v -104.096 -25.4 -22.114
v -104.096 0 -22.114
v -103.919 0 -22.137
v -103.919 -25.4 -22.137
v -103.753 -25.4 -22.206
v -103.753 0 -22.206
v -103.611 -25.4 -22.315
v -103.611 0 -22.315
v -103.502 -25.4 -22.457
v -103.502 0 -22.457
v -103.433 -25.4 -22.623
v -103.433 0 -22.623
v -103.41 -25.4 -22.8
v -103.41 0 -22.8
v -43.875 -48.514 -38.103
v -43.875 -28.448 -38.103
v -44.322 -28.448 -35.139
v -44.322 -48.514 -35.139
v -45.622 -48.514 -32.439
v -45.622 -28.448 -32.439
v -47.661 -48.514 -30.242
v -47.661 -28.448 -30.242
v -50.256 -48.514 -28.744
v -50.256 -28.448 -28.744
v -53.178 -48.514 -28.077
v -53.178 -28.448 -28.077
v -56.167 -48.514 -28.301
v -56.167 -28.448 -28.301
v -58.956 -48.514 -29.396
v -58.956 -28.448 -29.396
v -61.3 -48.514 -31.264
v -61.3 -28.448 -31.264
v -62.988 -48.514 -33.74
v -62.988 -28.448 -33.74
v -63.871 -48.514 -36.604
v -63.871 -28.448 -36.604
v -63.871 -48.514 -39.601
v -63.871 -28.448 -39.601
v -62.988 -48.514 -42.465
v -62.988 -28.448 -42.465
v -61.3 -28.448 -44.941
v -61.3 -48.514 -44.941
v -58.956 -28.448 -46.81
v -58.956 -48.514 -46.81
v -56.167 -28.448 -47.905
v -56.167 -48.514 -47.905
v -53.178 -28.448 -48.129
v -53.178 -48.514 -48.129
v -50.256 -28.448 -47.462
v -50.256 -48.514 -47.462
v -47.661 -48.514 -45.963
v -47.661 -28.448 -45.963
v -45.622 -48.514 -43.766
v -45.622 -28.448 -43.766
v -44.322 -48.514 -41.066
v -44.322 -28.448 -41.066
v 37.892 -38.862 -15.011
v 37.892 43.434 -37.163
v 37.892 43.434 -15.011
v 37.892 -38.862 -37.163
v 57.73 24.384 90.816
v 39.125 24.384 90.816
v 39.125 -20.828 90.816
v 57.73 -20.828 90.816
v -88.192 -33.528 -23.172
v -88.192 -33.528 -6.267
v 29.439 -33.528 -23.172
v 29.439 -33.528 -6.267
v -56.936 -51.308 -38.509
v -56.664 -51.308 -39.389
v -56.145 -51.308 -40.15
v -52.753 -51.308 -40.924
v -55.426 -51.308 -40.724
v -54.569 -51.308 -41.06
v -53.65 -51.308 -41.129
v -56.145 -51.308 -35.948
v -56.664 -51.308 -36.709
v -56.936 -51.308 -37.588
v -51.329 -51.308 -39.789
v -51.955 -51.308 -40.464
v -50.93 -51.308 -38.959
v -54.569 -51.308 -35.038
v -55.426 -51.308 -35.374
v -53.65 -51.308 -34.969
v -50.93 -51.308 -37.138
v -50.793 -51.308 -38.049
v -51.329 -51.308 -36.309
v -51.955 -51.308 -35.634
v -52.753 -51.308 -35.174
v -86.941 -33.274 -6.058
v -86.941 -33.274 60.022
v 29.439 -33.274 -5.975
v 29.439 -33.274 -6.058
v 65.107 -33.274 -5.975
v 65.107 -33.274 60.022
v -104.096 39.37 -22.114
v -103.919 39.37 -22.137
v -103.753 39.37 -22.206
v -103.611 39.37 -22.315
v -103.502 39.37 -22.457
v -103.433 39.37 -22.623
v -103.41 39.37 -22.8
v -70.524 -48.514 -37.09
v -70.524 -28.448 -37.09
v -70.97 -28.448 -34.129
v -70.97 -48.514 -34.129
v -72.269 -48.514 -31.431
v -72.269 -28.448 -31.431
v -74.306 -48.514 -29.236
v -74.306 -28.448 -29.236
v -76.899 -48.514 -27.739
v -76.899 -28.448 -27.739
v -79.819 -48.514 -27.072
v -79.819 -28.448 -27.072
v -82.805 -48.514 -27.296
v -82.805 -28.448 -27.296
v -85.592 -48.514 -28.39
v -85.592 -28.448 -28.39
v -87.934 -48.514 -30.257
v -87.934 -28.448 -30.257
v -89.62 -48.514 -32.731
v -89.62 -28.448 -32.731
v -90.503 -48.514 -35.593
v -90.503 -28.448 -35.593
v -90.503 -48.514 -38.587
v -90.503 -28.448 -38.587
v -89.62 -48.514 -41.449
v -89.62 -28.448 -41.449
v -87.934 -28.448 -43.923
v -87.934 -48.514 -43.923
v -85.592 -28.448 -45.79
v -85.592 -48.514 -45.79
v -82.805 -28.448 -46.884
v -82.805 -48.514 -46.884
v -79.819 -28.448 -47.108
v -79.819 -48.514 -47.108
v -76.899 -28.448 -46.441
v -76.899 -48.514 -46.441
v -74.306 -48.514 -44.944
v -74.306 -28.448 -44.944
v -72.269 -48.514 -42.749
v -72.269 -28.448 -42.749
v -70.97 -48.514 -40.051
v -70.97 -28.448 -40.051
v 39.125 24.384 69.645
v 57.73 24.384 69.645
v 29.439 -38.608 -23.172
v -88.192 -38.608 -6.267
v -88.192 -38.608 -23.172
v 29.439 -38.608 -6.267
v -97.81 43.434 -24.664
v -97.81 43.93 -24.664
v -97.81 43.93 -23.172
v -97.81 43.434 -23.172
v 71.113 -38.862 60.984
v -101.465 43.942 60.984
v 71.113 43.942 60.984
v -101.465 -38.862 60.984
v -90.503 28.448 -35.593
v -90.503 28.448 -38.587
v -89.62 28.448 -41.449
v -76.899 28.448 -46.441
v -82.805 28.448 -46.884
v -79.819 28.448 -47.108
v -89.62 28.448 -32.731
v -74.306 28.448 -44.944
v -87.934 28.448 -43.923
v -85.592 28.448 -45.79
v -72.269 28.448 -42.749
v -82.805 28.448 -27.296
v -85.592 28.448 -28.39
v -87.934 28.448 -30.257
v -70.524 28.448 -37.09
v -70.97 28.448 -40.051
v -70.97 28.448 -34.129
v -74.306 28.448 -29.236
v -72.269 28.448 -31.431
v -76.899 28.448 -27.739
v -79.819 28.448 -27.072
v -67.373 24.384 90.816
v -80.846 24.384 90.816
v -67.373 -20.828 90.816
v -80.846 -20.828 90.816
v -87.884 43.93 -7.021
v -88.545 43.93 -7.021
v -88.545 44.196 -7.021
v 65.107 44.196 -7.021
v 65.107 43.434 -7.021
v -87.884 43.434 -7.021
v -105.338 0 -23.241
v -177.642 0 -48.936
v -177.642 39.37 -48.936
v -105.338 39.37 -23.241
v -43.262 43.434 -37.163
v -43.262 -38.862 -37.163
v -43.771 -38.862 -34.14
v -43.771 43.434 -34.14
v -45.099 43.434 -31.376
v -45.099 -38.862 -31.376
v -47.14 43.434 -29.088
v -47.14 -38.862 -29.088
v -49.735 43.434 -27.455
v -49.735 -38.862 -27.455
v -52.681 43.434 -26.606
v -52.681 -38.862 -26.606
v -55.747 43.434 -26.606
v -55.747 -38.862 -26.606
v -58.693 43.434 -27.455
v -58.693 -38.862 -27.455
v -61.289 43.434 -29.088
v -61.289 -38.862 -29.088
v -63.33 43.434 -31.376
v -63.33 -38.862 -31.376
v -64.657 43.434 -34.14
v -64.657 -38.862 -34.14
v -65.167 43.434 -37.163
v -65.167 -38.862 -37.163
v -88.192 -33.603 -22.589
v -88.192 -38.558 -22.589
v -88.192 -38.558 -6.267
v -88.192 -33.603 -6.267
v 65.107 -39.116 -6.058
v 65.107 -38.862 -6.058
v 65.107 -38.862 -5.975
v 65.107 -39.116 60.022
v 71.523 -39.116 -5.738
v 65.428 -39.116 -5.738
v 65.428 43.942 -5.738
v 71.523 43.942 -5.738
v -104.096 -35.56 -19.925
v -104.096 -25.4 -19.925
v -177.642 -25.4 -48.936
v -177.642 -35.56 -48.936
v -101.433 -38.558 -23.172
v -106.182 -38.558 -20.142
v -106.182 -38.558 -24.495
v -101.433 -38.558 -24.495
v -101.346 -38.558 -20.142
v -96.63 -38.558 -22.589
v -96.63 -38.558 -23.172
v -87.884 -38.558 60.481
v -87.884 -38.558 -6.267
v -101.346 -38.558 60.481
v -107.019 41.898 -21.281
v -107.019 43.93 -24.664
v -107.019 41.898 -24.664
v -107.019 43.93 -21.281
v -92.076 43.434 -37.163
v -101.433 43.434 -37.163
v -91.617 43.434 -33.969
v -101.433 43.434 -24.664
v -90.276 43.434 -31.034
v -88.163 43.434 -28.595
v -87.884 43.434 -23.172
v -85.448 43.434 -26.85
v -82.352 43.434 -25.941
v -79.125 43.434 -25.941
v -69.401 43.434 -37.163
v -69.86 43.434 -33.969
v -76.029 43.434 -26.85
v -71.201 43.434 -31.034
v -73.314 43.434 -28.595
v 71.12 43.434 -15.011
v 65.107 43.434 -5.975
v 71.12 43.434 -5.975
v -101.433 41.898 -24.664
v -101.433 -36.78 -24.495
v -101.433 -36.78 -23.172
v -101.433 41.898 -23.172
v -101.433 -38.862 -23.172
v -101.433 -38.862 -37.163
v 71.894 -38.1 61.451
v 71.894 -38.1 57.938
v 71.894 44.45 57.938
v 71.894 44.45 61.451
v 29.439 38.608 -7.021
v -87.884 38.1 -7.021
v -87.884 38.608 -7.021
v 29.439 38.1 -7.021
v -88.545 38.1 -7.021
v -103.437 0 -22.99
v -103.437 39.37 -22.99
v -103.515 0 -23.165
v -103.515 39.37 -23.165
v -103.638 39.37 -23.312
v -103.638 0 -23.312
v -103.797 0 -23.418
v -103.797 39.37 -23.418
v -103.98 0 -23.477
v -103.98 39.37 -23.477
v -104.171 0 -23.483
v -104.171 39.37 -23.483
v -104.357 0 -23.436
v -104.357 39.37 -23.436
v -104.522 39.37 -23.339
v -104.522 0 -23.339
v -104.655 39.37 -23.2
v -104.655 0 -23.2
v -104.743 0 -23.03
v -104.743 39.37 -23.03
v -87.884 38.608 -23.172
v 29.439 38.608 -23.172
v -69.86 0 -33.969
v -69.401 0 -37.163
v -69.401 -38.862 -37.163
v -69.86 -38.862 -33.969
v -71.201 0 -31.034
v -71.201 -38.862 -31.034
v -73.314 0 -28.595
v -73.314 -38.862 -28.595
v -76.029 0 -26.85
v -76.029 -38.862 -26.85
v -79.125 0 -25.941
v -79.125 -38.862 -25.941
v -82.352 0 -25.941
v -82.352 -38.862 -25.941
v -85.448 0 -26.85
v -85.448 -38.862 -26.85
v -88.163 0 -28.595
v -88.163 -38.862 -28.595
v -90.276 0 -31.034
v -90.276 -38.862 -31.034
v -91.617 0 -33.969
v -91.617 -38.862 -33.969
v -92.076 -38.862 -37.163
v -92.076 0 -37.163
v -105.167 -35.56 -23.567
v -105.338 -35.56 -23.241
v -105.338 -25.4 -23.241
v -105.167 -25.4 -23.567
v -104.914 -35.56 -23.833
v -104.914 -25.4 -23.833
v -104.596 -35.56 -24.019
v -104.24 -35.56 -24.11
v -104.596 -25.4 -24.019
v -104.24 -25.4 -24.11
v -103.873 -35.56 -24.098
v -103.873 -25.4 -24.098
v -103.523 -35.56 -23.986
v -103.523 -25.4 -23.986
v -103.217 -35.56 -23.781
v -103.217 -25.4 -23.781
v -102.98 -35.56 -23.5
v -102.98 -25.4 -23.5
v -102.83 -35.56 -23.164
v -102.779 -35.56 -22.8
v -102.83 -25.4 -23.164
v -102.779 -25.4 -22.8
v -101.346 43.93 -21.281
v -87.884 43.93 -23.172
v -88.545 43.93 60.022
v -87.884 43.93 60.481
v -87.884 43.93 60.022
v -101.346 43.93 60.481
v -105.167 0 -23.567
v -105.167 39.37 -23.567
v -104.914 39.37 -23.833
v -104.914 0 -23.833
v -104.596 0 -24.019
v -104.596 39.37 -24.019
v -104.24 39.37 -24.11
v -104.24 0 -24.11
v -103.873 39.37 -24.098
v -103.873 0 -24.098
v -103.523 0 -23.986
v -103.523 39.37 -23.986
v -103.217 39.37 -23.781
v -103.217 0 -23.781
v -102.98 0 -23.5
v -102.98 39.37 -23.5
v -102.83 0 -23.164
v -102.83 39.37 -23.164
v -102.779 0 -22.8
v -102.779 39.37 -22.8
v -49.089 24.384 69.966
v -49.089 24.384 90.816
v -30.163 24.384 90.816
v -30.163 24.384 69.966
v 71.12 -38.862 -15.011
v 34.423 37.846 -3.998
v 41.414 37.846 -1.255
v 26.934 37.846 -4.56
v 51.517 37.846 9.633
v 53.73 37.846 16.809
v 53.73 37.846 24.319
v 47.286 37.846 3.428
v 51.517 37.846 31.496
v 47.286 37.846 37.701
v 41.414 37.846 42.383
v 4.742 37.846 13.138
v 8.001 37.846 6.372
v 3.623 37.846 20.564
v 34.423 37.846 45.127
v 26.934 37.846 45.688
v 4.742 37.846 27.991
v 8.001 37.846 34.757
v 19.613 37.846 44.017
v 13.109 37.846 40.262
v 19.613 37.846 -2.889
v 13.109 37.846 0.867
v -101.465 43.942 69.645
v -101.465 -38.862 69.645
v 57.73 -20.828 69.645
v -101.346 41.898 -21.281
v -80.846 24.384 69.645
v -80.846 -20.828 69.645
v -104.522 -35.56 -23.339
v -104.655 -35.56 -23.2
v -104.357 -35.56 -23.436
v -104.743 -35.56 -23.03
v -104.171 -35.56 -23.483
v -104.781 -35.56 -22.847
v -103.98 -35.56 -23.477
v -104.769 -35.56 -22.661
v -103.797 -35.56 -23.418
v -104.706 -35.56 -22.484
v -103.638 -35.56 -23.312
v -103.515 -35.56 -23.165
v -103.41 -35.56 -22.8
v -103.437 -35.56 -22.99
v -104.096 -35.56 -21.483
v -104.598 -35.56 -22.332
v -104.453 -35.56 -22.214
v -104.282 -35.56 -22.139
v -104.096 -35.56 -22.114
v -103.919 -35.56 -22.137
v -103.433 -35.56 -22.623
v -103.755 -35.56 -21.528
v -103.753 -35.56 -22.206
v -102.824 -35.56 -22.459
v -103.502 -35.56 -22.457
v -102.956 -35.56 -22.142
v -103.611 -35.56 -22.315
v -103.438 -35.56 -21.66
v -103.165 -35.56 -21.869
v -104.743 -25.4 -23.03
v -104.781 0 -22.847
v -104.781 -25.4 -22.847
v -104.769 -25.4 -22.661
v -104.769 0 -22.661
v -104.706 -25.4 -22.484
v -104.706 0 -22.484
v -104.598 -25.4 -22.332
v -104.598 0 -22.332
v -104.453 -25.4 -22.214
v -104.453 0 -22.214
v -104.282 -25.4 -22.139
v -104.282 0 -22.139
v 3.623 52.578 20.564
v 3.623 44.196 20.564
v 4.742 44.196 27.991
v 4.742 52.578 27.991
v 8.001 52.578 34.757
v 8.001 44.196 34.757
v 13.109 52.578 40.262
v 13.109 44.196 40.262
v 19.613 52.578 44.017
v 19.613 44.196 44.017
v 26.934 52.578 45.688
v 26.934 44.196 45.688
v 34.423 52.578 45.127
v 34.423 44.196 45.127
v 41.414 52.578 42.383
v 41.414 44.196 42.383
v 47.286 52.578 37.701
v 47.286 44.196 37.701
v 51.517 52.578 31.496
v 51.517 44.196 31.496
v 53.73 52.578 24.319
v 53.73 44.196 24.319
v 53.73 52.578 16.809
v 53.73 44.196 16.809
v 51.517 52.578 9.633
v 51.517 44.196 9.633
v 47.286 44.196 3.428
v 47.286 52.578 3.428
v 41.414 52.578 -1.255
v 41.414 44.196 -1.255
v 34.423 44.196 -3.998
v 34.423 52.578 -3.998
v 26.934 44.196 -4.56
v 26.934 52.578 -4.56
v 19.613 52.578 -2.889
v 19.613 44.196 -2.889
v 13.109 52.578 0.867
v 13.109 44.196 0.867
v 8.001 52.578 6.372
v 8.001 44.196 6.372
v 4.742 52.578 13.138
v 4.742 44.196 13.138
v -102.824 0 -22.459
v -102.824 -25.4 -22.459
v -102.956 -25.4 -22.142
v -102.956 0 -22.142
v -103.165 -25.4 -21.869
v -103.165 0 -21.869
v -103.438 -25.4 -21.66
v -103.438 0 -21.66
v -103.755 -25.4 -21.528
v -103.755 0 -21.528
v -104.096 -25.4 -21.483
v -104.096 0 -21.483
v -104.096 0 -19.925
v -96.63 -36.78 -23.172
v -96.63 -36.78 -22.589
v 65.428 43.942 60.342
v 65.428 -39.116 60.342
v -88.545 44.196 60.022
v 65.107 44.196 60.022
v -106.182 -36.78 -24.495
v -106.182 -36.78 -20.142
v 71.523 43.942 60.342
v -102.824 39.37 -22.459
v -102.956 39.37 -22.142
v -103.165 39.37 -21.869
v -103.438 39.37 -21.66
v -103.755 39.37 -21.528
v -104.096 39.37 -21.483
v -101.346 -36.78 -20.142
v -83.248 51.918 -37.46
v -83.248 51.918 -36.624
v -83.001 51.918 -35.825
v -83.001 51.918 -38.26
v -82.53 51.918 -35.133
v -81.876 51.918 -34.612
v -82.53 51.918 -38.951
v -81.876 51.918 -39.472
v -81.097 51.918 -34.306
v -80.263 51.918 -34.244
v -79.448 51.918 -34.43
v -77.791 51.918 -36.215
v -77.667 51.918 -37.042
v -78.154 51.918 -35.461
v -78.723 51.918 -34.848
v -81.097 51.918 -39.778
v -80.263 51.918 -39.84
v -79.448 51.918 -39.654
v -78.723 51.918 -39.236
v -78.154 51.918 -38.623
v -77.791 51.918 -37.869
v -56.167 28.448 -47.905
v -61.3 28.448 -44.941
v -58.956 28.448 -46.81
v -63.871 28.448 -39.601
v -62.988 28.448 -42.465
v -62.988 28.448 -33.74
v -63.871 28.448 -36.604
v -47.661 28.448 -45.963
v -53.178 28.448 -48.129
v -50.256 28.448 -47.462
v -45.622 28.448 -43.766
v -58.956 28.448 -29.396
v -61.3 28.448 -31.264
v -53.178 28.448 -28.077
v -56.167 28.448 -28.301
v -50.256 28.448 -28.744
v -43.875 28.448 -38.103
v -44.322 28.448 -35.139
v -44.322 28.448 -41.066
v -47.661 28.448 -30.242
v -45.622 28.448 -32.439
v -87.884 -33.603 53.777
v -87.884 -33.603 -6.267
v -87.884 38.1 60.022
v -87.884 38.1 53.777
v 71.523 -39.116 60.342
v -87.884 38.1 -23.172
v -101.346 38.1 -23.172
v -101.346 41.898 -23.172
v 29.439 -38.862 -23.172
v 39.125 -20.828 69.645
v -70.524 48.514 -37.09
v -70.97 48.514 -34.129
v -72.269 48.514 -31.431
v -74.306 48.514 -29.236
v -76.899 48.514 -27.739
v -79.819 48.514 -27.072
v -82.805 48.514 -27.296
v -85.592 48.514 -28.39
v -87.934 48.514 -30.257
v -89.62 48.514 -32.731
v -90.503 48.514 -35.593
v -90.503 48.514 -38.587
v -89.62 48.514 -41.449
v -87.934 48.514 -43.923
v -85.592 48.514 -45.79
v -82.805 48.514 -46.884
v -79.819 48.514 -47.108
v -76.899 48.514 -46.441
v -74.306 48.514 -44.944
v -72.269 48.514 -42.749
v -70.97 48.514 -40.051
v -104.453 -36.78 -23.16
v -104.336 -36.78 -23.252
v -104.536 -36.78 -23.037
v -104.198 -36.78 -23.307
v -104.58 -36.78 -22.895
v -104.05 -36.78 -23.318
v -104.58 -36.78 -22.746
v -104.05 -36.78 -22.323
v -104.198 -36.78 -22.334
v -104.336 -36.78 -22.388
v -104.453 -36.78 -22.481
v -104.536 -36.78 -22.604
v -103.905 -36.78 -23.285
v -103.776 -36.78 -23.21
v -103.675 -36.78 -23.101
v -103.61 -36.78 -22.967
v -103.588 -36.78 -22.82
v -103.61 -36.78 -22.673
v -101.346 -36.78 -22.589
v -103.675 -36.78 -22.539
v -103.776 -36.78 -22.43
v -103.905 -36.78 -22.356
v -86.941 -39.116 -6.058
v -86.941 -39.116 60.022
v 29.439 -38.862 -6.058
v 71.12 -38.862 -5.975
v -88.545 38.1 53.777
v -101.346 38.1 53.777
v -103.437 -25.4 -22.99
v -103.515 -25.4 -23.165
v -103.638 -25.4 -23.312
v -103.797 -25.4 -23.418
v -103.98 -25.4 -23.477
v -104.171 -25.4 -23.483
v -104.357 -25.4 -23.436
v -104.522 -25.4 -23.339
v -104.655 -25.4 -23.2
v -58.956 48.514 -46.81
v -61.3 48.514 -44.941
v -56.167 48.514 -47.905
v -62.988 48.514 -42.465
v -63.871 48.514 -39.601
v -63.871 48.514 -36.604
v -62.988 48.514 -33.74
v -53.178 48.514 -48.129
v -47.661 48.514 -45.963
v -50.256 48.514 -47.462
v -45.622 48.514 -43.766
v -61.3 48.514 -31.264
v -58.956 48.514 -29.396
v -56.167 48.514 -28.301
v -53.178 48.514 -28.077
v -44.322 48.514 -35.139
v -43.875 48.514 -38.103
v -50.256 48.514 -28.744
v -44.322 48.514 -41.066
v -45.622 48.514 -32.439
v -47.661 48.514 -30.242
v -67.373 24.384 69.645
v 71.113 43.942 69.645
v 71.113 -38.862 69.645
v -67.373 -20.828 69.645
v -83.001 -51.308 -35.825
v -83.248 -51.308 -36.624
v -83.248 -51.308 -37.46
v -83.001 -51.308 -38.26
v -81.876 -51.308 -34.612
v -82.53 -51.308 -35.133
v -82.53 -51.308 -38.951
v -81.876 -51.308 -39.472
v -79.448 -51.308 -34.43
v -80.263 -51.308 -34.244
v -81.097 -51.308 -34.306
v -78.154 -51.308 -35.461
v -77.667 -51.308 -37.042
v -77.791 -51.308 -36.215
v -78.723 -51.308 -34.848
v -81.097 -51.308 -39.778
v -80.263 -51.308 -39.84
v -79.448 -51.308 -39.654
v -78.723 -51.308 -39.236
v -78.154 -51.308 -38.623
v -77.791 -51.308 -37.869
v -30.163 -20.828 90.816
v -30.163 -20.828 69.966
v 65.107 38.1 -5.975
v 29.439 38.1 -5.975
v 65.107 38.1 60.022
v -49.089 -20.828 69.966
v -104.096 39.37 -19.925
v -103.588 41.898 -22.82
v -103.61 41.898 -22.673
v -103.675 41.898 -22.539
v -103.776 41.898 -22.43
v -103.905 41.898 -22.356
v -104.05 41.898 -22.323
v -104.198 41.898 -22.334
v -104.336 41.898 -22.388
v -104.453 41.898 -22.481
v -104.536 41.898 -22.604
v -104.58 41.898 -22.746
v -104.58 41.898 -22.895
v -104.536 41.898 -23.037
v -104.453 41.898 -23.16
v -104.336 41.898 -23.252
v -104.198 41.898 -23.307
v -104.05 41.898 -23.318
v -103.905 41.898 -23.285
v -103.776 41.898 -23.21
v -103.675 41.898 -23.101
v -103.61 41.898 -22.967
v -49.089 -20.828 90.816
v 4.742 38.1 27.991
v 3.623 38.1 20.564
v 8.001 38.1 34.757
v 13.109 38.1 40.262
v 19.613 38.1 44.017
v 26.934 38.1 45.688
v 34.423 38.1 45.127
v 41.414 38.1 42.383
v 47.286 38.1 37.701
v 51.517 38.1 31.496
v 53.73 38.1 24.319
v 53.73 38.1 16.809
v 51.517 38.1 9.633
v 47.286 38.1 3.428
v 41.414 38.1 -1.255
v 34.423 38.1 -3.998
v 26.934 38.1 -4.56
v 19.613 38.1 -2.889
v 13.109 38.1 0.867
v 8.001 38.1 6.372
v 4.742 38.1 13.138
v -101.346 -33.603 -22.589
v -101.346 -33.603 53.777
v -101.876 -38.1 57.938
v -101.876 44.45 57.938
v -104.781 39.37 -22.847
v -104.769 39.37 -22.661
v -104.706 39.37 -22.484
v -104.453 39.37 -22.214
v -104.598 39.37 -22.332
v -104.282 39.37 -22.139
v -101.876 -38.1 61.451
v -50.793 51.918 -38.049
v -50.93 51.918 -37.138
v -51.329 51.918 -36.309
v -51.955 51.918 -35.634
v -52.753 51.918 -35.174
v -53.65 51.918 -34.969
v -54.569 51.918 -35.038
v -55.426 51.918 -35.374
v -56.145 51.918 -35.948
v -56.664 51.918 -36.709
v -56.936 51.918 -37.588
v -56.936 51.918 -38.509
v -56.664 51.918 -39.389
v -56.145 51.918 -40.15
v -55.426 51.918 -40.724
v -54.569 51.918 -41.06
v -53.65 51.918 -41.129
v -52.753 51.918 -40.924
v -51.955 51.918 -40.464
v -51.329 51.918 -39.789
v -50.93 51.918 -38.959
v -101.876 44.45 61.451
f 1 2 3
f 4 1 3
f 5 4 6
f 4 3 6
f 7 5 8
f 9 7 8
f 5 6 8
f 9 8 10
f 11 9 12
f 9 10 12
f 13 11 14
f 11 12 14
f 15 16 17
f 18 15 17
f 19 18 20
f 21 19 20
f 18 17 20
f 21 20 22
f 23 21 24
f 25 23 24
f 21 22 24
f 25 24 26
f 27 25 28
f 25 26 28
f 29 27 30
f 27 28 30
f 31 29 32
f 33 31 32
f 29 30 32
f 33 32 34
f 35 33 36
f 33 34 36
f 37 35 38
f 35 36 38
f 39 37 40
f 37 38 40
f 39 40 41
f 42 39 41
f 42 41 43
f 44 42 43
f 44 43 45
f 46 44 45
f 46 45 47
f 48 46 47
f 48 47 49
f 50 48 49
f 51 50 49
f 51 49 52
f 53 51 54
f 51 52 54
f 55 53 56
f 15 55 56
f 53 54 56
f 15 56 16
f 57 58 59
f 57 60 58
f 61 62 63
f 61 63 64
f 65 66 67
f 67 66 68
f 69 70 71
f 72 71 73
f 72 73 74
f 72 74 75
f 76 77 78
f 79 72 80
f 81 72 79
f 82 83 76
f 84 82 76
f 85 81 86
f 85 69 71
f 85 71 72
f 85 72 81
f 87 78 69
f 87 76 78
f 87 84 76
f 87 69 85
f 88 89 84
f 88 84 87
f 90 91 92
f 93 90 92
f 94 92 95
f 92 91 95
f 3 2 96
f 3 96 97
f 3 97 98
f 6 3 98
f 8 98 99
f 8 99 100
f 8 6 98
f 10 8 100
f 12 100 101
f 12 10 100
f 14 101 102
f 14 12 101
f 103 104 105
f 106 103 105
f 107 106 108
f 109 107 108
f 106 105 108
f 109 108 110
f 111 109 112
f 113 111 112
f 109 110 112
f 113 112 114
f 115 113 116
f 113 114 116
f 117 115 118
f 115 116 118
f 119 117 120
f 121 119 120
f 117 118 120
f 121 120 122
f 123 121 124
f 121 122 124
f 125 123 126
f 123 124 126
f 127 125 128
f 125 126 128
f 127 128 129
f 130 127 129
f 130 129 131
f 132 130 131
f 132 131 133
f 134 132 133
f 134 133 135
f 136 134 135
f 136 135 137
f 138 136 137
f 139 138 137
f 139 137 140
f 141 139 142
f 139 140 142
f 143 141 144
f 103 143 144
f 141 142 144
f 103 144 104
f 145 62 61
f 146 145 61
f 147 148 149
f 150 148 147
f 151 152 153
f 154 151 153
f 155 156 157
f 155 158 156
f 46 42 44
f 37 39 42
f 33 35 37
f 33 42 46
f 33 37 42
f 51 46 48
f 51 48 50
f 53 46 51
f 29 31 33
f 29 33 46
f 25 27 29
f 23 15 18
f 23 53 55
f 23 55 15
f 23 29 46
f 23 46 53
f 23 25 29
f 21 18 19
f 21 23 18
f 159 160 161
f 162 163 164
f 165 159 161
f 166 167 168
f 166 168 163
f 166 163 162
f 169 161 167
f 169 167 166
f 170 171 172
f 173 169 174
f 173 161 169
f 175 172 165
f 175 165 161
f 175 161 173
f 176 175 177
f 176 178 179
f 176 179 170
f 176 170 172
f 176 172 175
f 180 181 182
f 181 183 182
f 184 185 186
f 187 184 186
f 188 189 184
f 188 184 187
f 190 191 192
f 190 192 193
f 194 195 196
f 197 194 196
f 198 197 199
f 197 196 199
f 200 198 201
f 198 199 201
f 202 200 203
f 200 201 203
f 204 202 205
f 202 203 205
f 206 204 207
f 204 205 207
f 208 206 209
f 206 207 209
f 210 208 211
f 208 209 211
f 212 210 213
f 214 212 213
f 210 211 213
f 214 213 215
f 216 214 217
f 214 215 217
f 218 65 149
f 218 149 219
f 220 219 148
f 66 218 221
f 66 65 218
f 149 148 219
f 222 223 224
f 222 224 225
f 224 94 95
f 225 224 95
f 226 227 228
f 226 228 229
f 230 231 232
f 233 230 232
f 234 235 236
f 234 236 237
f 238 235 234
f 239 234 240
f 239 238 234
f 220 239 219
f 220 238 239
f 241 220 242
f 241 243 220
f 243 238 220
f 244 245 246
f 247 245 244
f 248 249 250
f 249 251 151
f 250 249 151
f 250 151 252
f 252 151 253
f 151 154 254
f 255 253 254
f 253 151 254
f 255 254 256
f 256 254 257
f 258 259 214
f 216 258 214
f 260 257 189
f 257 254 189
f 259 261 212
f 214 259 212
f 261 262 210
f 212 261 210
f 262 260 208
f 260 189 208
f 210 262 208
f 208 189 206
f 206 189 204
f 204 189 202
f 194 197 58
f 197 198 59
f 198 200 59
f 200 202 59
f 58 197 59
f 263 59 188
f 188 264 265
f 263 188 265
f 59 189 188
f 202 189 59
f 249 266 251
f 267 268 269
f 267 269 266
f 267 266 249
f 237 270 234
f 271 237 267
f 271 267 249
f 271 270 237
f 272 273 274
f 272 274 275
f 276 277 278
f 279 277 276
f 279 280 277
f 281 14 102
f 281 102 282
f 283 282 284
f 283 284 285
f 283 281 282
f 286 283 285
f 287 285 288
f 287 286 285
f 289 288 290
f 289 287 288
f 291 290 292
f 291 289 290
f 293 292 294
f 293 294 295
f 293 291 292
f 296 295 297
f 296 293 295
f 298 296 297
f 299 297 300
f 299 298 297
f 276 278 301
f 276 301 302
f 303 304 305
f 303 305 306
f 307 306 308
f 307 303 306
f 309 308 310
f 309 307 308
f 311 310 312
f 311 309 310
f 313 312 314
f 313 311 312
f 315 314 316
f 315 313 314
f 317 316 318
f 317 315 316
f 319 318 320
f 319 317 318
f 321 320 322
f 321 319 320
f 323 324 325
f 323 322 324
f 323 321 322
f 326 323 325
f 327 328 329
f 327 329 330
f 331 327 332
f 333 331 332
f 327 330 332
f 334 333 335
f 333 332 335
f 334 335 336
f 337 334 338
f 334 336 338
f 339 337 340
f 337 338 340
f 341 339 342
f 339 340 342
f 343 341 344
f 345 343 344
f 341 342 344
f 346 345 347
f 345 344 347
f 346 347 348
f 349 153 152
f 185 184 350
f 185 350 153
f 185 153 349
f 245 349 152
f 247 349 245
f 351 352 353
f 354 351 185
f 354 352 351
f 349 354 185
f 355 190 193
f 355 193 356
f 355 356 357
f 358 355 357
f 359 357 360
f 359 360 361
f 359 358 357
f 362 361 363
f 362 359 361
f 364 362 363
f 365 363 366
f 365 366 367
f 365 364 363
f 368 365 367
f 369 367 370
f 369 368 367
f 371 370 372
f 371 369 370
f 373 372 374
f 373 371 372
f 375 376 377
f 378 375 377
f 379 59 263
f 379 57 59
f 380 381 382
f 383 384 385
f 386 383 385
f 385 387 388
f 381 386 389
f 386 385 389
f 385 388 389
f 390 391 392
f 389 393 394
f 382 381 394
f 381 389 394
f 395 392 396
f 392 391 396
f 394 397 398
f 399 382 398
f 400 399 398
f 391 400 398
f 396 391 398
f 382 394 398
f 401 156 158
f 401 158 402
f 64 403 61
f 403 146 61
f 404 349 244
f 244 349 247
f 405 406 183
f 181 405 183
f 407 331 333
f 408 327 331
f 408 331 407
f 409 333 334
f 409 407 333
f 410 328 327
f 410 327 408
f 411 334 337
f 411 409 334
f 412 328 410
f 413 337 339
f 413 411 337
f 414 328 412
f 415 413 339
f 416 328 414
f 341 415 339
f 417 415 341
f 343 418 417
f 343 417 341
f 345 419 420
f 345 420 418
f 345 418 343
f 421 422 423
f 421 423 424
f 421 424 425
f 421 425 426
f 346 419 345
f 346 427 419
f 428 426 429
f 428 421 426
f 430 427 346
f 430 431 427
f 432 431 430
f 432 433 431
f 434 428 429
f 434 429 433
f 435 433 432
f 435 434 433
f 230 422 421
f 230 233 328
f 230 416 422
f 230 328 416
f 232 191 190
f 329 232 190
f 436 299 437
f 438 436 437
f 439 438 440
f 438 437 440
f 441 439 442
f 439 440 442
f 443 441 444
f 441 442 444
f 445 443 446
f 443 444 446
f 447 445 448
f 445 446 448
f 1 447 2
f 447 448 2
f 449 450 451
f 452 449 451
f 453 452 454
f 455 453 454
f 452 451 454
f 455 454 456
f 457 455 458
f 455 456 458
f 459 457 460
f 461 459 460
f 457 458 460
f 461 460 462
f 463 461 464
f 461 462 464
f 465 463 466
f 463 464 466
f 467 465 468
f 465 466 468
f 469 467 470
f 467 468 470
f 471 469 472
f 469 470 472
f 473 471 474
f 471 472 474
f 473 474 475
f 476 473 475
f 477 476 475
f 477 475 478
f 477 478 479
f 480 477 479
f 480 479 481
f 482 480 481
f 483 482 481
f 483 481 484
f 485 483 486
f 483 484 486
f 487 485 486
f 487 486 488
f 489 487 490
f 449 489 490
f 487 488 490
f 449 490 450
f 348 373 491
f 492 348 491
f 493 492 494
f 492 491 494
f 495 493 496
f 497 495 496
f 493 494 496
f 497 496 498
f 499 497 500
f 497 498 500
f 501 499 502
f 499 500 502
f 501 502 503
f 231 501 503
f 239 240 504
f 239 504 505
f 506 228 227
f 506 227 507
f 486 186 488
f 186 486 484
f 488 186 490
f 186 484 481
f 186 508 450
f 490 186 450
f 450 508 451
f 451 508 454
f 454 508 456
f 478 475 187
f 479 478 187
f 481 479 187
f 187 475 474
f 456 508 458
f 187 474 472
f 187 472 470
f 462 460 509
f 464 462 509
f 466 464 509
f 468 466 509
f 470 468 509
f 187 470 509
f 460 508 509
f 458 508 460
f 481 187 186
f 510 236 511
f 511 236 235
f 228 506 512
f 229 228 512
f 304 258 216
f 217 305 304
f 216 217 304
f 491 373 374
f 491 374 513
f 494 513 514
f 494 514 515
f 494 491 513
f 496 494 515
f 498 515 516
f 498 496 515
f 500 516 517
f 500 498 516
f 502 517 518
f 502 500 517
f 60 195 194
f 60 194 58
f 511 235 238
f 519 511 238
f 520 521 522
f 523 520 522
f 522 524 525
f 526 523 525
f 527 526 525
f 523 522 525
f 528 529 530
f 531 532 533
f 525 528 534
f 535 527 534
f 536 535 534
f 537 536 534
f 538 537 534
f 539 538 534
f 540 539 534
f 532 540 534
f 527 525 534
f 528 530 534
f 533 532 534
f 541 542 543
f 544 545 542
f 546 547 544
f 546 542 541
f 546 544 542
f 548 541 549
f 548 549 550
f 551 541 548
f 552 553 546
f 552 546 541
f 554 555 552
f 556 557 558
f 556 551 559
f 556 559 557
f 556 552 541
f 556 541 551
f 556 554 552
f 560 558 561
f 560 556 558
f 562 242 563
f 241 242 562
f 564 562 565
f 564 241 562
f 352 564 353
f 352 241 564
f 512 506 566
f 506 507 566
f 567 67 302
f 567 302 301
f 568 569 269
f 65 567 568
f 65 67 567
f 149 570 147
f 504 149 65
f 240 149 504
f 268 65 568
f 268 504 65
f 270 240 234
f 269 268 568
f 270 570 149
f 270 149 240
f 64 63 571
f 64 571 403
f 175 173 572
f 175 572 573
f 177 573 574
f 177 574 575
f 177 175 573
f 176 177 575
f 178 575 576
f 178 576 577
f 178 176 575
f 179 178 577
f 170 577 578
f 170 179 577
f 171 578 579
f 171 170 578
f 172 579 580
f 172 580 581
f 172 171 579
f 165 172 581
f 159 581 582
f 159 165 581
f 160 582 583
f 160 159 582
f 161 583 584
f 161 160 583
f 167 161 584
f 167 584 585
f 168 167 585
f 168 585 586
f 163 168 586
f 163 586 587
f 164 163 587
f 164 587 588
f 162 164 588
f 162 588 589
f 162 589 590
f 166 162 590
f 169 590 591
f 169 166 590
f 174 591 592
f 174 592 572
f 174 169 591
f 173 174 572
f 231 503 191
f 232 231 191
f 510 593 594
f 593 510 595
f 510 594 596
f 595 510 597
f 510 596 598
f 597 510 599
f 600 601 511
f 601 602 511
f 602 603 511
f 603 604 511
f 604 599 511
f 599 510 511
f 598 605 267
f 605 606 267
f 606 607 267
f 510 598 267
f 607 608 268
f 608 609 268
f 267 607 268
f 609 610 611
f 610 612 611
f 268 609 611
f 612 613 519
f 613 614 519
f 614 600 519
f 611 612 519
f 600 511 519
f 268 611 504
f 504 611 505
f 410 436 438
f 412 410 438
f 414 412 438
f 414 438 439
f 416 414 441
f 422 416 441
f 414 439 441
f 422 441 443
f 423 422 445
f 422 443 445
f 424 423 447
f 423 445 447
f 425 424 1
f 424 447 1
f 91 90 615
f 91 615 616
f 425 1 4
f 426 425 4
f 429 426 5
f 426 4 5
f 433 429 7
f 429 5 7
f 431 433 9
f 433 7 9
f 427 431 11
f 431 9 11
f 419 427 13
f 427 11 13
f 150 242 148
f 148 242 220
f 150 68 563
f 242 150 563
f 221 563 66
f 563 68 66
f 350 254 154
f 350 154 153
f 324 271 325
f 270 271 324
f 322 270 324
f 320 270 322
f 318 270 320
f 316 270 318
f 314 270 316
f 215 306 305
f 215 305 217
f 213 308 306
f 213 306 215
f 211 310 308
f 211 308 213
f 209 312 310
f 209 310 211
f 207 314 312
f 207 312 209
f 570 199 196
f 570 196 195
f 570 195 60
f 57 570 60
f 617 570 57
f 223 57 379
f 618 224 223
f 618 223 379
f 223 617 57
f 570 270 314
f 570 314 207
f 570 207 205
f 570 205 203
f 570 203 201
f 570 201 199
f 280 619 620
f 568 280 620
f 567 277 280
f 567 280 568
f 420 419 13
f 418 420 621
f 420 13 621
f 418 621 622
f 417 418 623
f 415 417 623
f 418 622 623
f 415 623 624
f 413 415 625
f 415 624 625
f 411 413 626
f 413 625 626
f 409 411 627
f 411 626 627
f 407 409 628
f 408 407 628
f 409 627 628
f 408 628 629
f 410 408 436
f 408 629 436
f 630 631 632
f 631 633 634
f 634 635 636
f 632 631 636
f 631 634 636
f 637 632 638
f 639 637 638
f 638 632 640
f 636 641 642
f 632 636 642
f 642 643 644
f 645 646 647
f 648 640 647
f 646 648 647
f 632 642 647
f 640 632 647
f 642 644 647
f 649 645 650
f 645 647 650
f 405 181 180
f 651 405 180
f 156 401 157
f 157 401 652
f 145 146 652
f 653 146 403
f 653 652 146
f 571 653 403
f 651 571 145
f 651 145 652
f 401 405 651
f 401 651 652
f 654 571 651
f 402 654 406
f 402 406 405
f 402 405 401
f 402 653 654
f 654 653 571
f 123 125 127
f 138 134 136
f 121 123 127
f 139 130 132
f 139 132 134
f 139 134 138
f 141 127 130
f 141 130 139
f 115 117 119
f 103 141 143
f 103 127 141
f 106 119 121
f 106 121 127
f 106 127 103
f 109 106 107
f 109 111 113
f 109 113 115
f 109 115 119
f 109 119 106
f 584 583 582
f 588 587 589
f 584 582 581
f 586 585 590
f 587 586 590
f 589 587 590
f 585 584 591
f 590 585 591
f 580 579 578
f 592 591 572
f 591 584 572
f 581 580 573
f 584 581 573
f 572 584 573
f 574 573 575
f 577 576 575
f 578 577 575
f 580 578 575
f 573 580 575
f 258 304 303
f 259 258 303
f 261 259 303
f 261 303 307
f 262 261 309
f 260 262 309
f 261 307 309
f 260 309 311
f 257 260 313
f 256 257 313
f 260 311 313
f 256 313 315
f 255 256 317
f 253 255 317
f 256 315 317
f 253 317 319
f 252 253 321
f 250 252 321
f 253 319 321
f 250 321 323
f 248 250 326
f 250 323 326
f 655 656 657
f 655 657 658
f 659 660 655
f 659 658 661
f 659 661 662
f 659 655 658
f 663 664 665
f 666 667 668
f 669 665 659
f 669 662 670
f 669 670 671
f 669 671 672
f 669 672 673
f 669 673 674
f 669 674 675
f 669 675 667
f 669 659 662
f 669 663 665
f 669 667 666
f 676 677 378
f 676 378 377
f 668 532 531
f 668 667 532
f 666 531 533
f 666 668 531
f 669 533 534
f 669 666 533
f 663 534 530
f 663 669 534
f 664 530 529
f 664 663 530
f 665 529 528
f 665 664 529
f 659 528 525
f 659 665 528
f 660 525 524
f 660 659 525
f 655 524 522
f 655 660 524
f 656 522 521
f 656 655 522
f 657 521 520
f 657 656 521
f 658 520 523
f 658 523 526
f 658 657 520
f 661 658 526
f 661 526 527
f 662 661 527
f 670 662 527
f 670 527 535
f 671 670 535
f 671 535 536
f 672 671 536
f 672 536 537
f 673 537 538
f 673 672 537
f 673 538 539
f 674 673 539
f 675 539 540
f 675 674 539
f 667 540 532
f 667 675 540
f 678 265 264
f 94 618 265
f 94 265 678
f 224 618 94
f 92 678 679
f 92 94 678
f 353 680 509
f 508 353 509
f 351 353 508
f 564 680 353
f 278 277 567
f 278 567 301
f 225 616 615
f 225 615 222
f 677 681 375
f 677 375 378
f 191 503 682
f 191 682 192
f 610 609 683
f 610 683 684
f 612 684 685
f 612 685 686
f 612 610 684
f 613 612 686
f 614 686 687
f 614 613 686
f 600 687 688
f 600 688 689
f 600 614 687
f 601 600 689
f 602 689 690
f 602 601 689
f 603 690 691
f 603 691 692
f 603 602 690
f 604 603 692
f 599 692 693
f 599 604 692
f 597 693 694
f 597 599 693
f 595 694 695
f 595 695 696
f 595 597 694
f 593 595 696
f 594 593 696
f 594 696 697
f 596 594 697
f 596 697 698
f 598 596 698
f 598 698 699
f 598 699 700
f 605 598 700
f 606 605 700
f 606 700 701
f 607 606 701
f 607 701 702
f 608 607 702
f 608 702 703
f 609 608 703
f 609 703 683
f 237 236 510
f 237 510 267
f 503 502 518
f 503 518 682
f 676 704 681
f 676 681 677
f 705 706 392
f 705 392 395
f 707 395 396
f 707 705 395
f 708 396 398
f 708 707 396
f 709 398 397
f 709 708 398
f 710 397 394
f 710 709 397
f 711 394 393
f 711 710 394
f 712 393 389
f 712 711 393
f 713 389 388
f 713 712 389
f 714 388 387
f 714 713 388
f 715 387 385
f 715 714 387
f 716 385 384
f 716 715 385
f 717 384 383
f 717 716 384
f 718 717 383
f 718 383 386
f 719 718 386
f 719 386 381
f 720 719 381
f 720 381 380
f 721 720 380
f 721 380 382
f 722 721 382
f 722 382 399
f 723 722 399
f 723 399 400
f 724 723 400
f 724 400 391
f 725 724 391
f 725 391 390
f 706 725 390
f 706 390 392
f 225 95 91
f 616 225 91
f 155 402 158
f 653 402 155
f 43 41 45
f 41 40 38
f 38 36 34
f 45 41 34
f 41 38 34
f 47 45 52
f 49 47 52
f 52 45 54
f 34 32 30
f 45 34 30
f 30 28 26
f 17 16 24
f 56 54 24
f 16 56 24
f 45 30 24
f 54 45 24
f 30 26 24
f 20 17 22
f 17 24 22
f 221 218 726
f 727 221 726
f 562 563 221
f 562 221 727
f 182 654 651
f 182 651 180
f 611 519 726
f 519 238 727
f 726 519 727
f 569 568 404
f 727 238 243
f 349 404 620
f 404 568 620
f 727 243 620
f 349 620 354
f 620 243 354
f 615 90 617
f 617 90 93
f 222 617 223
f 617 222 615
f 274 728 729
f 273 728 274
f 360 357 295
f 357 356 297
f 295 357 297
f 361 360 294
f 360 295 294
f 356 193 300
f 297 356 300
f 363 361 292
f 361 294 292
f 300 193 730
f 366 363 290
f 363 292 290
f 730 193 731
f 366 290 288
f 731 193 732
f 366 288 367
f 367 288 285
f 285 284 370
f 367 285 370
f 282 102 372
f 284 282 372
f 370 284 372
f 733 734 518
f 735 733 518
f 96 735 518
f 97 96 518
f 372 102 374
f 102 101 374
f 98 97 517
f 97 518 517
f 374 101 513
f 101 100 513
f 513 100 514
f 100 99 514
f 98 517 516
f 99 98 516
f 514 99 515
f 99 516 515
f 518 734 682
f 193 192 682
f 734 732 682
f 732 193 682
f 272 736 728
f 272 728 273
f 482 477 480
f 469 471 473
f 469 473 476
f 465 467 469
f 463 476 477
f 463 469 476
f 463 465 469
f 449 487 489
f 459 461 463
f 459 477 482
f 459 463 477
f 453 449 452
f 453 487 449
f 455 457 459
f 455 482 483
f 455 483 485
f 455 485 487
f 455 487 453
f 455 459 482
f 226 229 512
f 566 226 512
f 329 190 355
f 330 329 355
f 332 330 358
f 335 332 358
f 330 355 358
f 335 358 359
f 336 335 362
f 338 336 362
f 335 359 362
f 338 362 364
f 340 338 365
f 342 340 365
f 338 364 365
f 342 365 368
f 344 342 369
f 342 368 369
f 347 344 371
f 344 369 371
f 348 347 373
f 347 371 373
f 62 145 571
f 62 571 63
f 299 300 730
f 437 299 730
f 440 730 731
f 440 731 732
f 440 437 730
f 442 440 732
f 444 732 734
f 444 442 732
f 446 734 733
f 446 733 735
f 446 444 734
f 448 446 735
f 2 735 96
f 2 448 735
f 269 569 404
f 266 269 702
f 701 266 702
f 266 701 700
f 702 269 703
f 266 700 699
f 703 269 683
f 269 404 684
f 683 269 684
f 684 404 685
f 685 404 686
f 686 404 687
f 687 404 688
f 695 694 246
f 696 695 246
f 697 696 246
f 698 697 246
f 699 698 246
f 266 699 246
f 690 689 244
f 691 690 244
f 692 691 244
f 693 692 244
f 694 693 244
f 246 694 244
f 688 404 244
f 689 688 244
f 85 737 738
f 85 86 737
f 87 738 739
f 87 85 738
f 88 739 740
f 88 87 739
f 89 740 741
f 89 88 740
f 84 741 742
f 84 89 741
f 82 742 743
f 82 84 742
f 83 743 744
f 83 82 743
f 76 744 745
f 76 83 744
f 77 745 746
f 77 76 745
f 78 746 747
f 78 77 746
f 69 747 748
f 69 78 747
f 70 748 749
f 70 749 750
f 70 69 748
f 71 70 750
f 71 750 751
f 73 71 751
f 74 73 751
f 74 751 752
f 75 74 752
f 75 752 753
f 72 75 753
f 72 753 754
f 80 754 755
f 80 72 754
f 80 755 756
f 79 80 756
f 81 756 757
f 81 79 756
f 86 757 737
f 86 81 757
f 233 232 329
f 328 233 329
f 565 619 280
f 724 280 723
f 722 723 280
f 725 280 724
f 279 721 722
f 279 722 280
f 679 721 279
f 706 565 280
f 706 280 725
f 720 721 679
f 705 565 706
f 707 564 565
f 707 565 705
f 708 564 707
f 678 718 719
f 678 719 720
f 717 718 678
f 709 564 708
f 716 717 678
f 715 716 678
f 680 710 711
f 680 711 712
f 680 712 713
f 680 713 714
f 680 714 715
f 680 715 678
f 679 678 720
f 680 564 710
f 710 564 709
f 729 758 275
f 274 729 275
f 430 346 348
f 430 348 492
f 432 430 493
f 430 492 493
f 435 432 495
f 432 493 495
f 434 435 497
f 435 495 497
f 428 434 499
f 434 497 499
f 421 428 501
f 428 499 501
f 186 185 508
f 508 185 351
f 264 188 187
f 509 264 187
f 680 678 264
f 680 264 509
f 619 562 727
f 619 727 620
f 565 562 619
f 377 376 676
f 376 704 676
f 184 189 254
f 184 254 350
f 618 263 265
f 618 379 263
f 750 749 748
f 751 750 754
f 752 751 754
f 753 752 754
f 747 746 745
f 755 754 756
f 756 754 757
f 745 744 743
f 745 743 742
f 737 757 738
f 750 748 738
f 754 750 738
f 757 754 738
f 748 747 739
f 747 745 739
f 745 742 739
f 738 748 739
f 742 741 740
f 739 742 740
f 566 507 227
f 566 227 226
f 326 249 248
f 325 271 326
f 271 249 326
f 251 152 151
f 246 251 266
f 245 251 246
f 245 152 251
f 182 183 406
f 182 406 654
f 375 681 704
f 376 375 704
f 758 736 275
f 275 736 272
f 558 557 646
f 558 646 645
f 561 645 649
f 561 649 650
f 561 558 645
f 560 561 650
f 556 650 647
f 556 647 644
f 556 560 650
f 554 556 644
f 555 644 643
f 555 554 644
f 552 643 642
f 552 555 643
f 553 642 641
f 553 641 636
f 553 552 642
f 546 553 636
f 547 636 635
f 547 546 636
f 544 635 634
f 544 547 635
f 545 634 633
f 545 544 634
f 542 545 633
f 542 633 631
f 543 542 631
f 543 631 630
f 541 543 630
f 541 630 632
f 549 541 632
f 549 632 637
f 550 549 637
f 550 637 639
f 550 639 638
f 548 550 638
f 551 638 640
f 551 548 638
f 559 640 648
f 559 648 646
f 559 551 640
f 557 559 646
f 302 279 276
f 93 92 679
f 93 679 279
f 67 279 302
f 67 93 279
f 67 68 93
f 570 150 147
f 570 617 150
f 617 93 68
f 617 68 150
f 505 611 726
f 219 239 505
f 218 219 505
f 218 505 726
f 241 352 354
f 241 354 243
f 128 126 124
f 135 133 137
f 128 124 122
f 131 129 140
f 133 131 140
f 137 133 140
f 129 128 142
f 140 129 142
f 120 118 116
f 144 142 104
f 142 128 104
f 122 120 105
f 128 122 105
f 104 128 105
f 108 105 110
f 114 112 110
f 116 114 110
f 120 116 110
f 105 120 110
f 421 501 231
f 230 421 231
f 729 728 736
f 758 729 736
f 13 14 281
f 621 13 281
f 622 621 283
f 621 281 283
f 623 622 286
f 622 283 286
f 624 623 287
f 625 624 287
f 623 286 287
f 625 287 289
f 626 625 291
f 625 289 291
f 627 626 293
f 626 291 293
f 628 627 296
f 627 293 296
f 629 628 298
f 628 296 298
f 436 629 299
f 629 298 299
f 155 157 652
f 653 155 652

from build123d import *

# Parameters (mm, degrees)
F1_DEPTH       = 38.862
F1_DEPTH_BACK  = 43.434
F2_R           = 11.3376030002
F2_R_2         = 10.956529081
F3_DEPTH       = 43.942
F3_DEPTH_BACK  = 49.276
F5_START       = 33.528
F4_W           = 45.4701650888
F4_H           = 16.9055731967
F4_W_2         = 72.5773833692
F5_DEPTH       = 5.08
F7_START       = -38.608
F6_W           = 51.5911467373
F6_H           = 16.6140981019
F6_W_2         = 65.8734384924
F7_DEPTH       = 4.826
F9_START       = -87.884
F8_W           = 71.702953428
F8_H           = 6.7039392889
F9_DEPTH       = 13.462
F11_DEPTH      = 35.56
F11_DEPTH_BACK = 39.37
F12_W          = 6.0947537422
F12_H          = 66.0799681209
F13_DEPTH      = 39.116
F13_DEPTH_BACK = 43.942
F15_START      = 33.274
F14_W          = 65.1074424386
F14_H          = 66.0799662583
F14_W_2        = 86.940638721
F15_DEPTH      = 5.842
F17_START      = -38.1
F16_W          = 65.1074424386
F16_H          = 67.042295821
F16_W_2        = 88.5445252061
F17_DEPTH      = 6.096
F18_W          = 100.7238291204
F18_H          = 8.6609646678
F18_W_2        = 71.8539468944
F19_DEPTH      = 38.862
F19_DEPTH_BACK = 43.942
F20_W          = 18.925813958
F20_H          = 20.8504721522
F21_DEPTH      = 20.828
F21_DEPTH_BACK = 24.384
F20_W_2        = 13.4726166725
F20_H_2        = 22.1335813403
F20_W_3        = 18.6050385237
F20_H_3        = 21.1712494493
F22_W          = 173.7697198987
F22_H          = 3.5137236118
F23_DEPTH      = 38.1
F23_DEPTH_BACK = 44.45
F24_DEPTH      = 25.4
F25_W          = 9.2087239027
F25_H          = 3.3827982843
F26_DEPTH      = 2.032
F27_W          = 9.5522403717
F27_H          = 4.3528731912
F28_DEPTH      = 1.778
F29_R          = 0.498771705
F30_DEPTH      = 81.28
F32_START      = 28.448
F31_R          = 10.0539795899
F32_DEPTH      = 20.066
F31_R_2        = 10.0456530786
F34_R          = 3.0887352078
F35_DEPTH      = 51.308
F35_DEPTH_BACK = 51.9176
F34_R_2        = 2.8061072416
F36_R          = 25.1944748939
F37_DEPTH      = 8.382
F37_DEPTH_BACK = 6.35


with BuildPart() as f1:
    # F0 (on Front) → F1 (new body, two sides)
    with BuildSketch(Plane.XZ) as f1_sk:
        Polygon((71.1200013757, -15.0109836832), (71.1200013757, -5.9752459638), (29.439015314, -5.9752459638), (29.439015314, -23.172294721), (-101.4334410429, -23.172294721), (-101.4334410429, -37.1631160378), (37.891805172, -37.1631160378), (37.891805172, -15.0109836832), align=None)
    extrude(amount=F1_DEPTH)
    extrude(f1_sk.sketch, amount=-F1_DEPTH_BACK)

    # F2 (on Front) → F3 (cut, two sides)
    with BuildSketch(Plane.XZ) as f3_sk:
        with Locations((-80.7386860251, -37.1631160378)):
            Circle(F2_R)
        with Locations((-54.214425385, -37.4545902014)):
            Circle(F2_R_2)
    extrude(amount=F3_DEPTH, mode=Mode.SUBTRACT)
    extrude(f3_sk.sketch, amount=-F3_DEPTH_BACK, mode=Mode.SUBTRACT)

    # F4 (on Front) → F5 (join)
    with BuildSketch(Plane.XZ.offset(F5_START)):
        with Locations((7.120330818, -14.7195081227)):
            Rectangle(F4_W, F4_H)
        with Locations((-51.903443411, -14.7195081227)):
            Rectangle(F4_W_2, F4_H)
    extrude(amount=F5_DEPTH)

    # F6 (on Front) → F7 (join)
    with BuildSketch(Plane.XZ.offset(F7_START)):
        with Locations((3.6434419453, -14.8652456701)):
            Rectangle(F6_W, F6_H)
        with Locations((-55.0888506696, -14.8652456701)):
            Rectangle(F6_W_2, F6_H)
    extrude(amount=-F7_DEPTH)

    # F8 (on Right) → F9 (join)
    with BuildSketch(Plane.YZ.offset(F9_START)):
        Polygon((38.1000041962, -23.172294721), (43.9295098186, -23.172294721), (43.9295098186, 60.4811497033), (38.1000041962, 60.4811497033), (38.1000041962, 53.7772104144), align=None)
        with Locations((2.2485274822, 57.1291800588)):
            Rectangle(F8_W, F8_H)
        Polygon((-33.6029492319, -22.5893463939), (-33.6029492319, 53.7772104144), (-33.6029492319, 60.4811497033), (-38.5580323637, 60.4811497033), (-38.5580323637, -22.5893463939), align=None)
    extrude(amount=-F9_DEPTH)

    # F14 (on Front) → F15 (join)
    with BuildSketch(Plane.XZ.offset(F15_START)):
        with Locations((32.5537212193, 26.9815365318)):
            Rectangle(F14_W, F14_H)
        with Locations((-43.4703193605, 26.9815365318)):
            Rectangle(F14_W_2, F14_H)
    extrude(amount=F15_DEPTH)

    # F16 (on Front) → F17 (join)
    with BuildSketch(Plane.XZ.offset(F17_START)):
        with Locations((32.5537212193, 26.5003717504)):
            Rectangle(F16_W, F16_H)
        with Locations((-44.272262603, 26.5003717504)):
            Rectangle(F16_W_2, F16_H)
    extrude(amount=-F17_DEPTH)

    # F25 (on face) → F26 (join)
    with BuildSketch(Plane(origin=(0, 43.9295098186, 0), x_dir=(-1, 0, 0), z_dir=(0, 1, 0))):
        with Locations((102.4142354727, -22.9727905244)):
            Rectangle(F25_W, F25_H)
    extrude(amount=-F26_DEPTH)

    # F27 (on face) → F28 (join)
    with BuildSketch(Plane.XZ.offset(38.5580323637)):
        with Locations((-101.4059185982, -22.3182095215)):
            Rectangle(F27_W, F27_H)
    extrude(amount=-F28_DEPTH)

    # F29 (on face) → F30 (join)
    with BuildSketch(Plane.XZ.offset(38.5580323637)):
        with Locations((-104.0869578719, -22.8203143924)):
            Circle(F29_R)
    extrude(amount=-F30_DEPTH)

    # F36 (on face) → F37 (join, two sides)
    with BuildSketch(Plane(origin=(0, 44.196, 0), x_dir=(-1, 0, 0), z_dir=(0, 1, 0))) as f37_sk:
        with Locations((-28.8171786815, 20.5643624067)):
            Circle(F36_R)
    extrude(amount=F37_DEPTH)
    extrude(f37_sk.sketch, amount=-F37_DEPTH_BACK)


with BuildPart() as f11:
    # F10 (on Front) → F11 (new body, two sides)
    with BuildSketch(Plane.XZ) as f11_sk:
        with BuildLine():
            ThreePointArc((-103.4097694487, -22.8003077209), (-103.9796929185, -23.476895095), (-104.7432717539, -23.0302066148))
            Line((-104.7432717539, -23.0302066148), (-105.3375046329, -23.2413774079))
            ThreePointArc((-105.3375046329, -23.2413774079), (-103.8725498773, -24.0983660815), (-102.7791302347, -22.8003077209))
            ThreePointArc((-102.7791302347, -22.8003077209), (-103.1649315017, -21.8689010697), (-104.0963381529, -21.4830998027))
            Line((-104.0963381529, -21.4830998027), (-104.0963381529, -22.1137390167))
            ThreePointArc((-104.0963381529, -22.1137390167), (-103.6108607664, -22.3148303344), (-103.4097694487, -22.8003077209))
        make_face()
        with BuildLine():
            Line((-105.3375046329, -23.2413774079), (-104.7432717539, -23.0302066148))
            ThreePointArc((-104.7432717539, -23.0302066148), (-104.6572383094, -22.4043688368), (-104.0963381529, -22.1137390167))
            Line((-104.0963381529, -22.1137390167), (-104.0963381529, -21.4830998027))
            ThreePointArc((-104.0963381529, -21.4830998027), (-105.1724462292, -22.0406840589), (-105.3375046329, -23.2413774079))
        make_face()
        with BuildLine():
            Line((-177.6416003704, -48.9358715713), (-105.3375046329, -23.2413774079))
            ThreePointArc((-105.3375046329, -23.2413774079), (-105.1724462292, -22.0406840589), (-104.0963381529, -21.4830998027))
            Line((-104.0963381529, -21.4830998027), (-104.0963381529, -19.9252068996))
            Line((-104.0963381529, -19.9252068996), (-177.6416003704, -48.9358715713))
        make_face()
    extrude(amount=F11_DEPTH)
    extrude(f11_sk.sketch, amount=-F11_DEPTH_BACK)

    # F10 (on Front) → F24 (join)
    with BuildSketch(Plane.XZ):
        with BuildLine():
            ThreePointArc((-103.4097694487, -22.8003077209), (-103.9796929185, -23.476895095), (-104.7432717539, -23.0302066148))
            Line((-104.7432717539, -23.0302066148), (-105.3375046329, -23.2413774079))
            ThreePointArc((-105.3375046329, -23.2413774079), (-103.8725498773, -24.0983660815), (-102.7791302347, -22.8003077209))
            ThreePointArc((-102.7791302347, -22.8003077209), (-103.1649315017, -21.8689010697), (-104.0963381529, -21.4830998027))
            Line((-104.0963381529, -21.4830998027), (-104.0963381529, -22.1137390167))
            ThreePointArc((-104.0963381529, -22.1137390167), (-103.6108607664, -22.3148303344), (-103.4097694487, -22.8003077209))
        make_face()
        with BuildLine():
            Line((-105.3375046329, -23.2413774079), (-104.7432717539, -23.0302066148))
            ThreePointArc((-104.7432717539, -23.0302066148), (-104.6572383094, -22.4043688368), (-104.0963381529, -22.1137390167))
            Line((-104.0963381529, -22.1137390167), (-104.0963381529, -21.4830998027))
            ThreePointArc((-104.0963381529, -21.4830998027), (-105.1724462292, -22.0406840589), (-105.3375046329, -23.2413774079))
        make_face()
        with BuildLine():
            Line((-177.6416003704, -48.9358715713), (-105.3375046329, -23.2413774079))
            ThreePointArc((-105.3375046329, -23.2413774079), (-105.1724462292, -22.0406840589), (-104.0963381529, -21.4830998027))
            Line((-104.0963381529, -21.4830998027), (-104.0963381529, -19.9252068996))
            Line((-104.0963381529, -19.9252068996), (-177.6416003704, -48.9358715713))
        make_face()
    extrude(amount=F24_DEPTH)


with BuildPart() as f13:
    # F12 (on Front) → F13 (new body, two sides)
    with BuildSketch(Plane.XZ) as f13_sk:
        with Locations((68.4755966067, 27.3023128975)):
            Rectangle(F12_W, F12_H)
    extrude(amount=F13_DEPTH)
    extrude(f13_sk.sketch, amount=-F13_DEPTH_BACK)


with BuildPart() as f19:
    # F18 (on Front) → F19 (new body, two sides)
    with BuildSketch(Plane.XZ) as f19_sk:
        with Locations((20.7512695342, 65.3143338859)):
            Rectangle(F18_W, F18_H)
        with Locations((-65.5376184732, 65.3143338859)):
            Rectangle(F18_W_2, F18_H)
    extrude(amount=F19_DEPTH)
    extrude(f19_sk.sketch, amount=-F19_DEPTH_BACK)

    # F20 (on Front) → F21, piece 2 (join, two sides)
    with BuildSketch(Plane.XZ) as f21_2_sk:
        with Locations((-74.1095766425, 79.7492749989)):
            Rectangle(F20_W_2, F20_H_2)
        with Locations((48.4270602465, 80.2304409444)):
            Rectangle(F20_W_3, F20_H_3)
    extrude(amount=F21_DEPTH)
    extrude(f21_2_sk.sketch, amount=-F21_DEPTH_BACK)


with BuildPart() as f21:
    # F20 (on Front) → F21 (new body, two sides)
    with BuildSketch(Plane.XZ) as f21_sk:
        with Locations((-39.6261001006, 80.3908295929)):
            Rectangle(F20_W, F20_H)
    extrude(amount=F21_DEPTH)
    extrude(f21_sk.sketch, amount=-F21_DEPTH_BACK)


with BuildPart() as f23:
    # F22 (on Front) → F23 (new body, two sides)
    with BuildSketch(Plane.XZ) as f23_sk:
        with Locations((-14.9909071624, 59.6944950521)):
            Rectangle(F22_W, F22_H)
    extrude(amount=F23_DEPTH)
    extrude(f23_sk.sketch, amount=-F23_DEPTH_BACK)


with BuildPart() as f32:
    # F31 (on Front) → F32 (new body)
    with BuildSketch(Plane.XZ.offset(F32_START)):
        with Locations((-53.9294593036, -38.1027087569)):
            Circle(F31_R)
    extrude(amount=F32_DEPTH)


with BuildPart() as f32b:
    # F31 (on Front) → F32, piece 2 (new body)
    with BuildSketch(Plane.XZ.offset(F32_START)):
        with Locations((-80.5695578456, -37.0900221169)):
            Circle(F31_R_2)
    extrude(amount=F32_DEPTH)


with BuildPart() as f33_1:
    # F33: instance of F32
    add(f32.part.mirror(Plane.XZ))


with BuildPart() as f33_2:
    # F33: instance of F32b
    add(f32b.part.mirror(Plane.XZ))


with BuildPart() as f35:
    # F34 (on Front) → F35 (new body, two sides)
    with BuildSketch(Plane.XZ) as f35_sk:
        with Locations((-53.8812689483, -38.0488410592)):
            Circle(F34_R)
    extrude(amount=F35_DEPTH)
    extrude(f35_sk.sketch, amount=-F35_DEPTH_BACK)


with BuildPart() as f35b:
    # F34 (on Front) → F35, piece 2 (new body, two sides)
    with BuildSketch(Plane.XZ) as f35_2_sk:
        with Locations((-80.4727450013, -37.0420366526)):
            Circle(F34_R_2)
    extrude(amount=F35_DEPTH)
    extrude(f35_2_sk.sketch, amount=-F35_DEPTH_BACK)


solid = Compound([f1.part, f11.part, f13.part, f19.part, f21.part, f23.part, f32.part, f32b.part, f33_1.part, f33_2.part, f35.part, f35b.part])
